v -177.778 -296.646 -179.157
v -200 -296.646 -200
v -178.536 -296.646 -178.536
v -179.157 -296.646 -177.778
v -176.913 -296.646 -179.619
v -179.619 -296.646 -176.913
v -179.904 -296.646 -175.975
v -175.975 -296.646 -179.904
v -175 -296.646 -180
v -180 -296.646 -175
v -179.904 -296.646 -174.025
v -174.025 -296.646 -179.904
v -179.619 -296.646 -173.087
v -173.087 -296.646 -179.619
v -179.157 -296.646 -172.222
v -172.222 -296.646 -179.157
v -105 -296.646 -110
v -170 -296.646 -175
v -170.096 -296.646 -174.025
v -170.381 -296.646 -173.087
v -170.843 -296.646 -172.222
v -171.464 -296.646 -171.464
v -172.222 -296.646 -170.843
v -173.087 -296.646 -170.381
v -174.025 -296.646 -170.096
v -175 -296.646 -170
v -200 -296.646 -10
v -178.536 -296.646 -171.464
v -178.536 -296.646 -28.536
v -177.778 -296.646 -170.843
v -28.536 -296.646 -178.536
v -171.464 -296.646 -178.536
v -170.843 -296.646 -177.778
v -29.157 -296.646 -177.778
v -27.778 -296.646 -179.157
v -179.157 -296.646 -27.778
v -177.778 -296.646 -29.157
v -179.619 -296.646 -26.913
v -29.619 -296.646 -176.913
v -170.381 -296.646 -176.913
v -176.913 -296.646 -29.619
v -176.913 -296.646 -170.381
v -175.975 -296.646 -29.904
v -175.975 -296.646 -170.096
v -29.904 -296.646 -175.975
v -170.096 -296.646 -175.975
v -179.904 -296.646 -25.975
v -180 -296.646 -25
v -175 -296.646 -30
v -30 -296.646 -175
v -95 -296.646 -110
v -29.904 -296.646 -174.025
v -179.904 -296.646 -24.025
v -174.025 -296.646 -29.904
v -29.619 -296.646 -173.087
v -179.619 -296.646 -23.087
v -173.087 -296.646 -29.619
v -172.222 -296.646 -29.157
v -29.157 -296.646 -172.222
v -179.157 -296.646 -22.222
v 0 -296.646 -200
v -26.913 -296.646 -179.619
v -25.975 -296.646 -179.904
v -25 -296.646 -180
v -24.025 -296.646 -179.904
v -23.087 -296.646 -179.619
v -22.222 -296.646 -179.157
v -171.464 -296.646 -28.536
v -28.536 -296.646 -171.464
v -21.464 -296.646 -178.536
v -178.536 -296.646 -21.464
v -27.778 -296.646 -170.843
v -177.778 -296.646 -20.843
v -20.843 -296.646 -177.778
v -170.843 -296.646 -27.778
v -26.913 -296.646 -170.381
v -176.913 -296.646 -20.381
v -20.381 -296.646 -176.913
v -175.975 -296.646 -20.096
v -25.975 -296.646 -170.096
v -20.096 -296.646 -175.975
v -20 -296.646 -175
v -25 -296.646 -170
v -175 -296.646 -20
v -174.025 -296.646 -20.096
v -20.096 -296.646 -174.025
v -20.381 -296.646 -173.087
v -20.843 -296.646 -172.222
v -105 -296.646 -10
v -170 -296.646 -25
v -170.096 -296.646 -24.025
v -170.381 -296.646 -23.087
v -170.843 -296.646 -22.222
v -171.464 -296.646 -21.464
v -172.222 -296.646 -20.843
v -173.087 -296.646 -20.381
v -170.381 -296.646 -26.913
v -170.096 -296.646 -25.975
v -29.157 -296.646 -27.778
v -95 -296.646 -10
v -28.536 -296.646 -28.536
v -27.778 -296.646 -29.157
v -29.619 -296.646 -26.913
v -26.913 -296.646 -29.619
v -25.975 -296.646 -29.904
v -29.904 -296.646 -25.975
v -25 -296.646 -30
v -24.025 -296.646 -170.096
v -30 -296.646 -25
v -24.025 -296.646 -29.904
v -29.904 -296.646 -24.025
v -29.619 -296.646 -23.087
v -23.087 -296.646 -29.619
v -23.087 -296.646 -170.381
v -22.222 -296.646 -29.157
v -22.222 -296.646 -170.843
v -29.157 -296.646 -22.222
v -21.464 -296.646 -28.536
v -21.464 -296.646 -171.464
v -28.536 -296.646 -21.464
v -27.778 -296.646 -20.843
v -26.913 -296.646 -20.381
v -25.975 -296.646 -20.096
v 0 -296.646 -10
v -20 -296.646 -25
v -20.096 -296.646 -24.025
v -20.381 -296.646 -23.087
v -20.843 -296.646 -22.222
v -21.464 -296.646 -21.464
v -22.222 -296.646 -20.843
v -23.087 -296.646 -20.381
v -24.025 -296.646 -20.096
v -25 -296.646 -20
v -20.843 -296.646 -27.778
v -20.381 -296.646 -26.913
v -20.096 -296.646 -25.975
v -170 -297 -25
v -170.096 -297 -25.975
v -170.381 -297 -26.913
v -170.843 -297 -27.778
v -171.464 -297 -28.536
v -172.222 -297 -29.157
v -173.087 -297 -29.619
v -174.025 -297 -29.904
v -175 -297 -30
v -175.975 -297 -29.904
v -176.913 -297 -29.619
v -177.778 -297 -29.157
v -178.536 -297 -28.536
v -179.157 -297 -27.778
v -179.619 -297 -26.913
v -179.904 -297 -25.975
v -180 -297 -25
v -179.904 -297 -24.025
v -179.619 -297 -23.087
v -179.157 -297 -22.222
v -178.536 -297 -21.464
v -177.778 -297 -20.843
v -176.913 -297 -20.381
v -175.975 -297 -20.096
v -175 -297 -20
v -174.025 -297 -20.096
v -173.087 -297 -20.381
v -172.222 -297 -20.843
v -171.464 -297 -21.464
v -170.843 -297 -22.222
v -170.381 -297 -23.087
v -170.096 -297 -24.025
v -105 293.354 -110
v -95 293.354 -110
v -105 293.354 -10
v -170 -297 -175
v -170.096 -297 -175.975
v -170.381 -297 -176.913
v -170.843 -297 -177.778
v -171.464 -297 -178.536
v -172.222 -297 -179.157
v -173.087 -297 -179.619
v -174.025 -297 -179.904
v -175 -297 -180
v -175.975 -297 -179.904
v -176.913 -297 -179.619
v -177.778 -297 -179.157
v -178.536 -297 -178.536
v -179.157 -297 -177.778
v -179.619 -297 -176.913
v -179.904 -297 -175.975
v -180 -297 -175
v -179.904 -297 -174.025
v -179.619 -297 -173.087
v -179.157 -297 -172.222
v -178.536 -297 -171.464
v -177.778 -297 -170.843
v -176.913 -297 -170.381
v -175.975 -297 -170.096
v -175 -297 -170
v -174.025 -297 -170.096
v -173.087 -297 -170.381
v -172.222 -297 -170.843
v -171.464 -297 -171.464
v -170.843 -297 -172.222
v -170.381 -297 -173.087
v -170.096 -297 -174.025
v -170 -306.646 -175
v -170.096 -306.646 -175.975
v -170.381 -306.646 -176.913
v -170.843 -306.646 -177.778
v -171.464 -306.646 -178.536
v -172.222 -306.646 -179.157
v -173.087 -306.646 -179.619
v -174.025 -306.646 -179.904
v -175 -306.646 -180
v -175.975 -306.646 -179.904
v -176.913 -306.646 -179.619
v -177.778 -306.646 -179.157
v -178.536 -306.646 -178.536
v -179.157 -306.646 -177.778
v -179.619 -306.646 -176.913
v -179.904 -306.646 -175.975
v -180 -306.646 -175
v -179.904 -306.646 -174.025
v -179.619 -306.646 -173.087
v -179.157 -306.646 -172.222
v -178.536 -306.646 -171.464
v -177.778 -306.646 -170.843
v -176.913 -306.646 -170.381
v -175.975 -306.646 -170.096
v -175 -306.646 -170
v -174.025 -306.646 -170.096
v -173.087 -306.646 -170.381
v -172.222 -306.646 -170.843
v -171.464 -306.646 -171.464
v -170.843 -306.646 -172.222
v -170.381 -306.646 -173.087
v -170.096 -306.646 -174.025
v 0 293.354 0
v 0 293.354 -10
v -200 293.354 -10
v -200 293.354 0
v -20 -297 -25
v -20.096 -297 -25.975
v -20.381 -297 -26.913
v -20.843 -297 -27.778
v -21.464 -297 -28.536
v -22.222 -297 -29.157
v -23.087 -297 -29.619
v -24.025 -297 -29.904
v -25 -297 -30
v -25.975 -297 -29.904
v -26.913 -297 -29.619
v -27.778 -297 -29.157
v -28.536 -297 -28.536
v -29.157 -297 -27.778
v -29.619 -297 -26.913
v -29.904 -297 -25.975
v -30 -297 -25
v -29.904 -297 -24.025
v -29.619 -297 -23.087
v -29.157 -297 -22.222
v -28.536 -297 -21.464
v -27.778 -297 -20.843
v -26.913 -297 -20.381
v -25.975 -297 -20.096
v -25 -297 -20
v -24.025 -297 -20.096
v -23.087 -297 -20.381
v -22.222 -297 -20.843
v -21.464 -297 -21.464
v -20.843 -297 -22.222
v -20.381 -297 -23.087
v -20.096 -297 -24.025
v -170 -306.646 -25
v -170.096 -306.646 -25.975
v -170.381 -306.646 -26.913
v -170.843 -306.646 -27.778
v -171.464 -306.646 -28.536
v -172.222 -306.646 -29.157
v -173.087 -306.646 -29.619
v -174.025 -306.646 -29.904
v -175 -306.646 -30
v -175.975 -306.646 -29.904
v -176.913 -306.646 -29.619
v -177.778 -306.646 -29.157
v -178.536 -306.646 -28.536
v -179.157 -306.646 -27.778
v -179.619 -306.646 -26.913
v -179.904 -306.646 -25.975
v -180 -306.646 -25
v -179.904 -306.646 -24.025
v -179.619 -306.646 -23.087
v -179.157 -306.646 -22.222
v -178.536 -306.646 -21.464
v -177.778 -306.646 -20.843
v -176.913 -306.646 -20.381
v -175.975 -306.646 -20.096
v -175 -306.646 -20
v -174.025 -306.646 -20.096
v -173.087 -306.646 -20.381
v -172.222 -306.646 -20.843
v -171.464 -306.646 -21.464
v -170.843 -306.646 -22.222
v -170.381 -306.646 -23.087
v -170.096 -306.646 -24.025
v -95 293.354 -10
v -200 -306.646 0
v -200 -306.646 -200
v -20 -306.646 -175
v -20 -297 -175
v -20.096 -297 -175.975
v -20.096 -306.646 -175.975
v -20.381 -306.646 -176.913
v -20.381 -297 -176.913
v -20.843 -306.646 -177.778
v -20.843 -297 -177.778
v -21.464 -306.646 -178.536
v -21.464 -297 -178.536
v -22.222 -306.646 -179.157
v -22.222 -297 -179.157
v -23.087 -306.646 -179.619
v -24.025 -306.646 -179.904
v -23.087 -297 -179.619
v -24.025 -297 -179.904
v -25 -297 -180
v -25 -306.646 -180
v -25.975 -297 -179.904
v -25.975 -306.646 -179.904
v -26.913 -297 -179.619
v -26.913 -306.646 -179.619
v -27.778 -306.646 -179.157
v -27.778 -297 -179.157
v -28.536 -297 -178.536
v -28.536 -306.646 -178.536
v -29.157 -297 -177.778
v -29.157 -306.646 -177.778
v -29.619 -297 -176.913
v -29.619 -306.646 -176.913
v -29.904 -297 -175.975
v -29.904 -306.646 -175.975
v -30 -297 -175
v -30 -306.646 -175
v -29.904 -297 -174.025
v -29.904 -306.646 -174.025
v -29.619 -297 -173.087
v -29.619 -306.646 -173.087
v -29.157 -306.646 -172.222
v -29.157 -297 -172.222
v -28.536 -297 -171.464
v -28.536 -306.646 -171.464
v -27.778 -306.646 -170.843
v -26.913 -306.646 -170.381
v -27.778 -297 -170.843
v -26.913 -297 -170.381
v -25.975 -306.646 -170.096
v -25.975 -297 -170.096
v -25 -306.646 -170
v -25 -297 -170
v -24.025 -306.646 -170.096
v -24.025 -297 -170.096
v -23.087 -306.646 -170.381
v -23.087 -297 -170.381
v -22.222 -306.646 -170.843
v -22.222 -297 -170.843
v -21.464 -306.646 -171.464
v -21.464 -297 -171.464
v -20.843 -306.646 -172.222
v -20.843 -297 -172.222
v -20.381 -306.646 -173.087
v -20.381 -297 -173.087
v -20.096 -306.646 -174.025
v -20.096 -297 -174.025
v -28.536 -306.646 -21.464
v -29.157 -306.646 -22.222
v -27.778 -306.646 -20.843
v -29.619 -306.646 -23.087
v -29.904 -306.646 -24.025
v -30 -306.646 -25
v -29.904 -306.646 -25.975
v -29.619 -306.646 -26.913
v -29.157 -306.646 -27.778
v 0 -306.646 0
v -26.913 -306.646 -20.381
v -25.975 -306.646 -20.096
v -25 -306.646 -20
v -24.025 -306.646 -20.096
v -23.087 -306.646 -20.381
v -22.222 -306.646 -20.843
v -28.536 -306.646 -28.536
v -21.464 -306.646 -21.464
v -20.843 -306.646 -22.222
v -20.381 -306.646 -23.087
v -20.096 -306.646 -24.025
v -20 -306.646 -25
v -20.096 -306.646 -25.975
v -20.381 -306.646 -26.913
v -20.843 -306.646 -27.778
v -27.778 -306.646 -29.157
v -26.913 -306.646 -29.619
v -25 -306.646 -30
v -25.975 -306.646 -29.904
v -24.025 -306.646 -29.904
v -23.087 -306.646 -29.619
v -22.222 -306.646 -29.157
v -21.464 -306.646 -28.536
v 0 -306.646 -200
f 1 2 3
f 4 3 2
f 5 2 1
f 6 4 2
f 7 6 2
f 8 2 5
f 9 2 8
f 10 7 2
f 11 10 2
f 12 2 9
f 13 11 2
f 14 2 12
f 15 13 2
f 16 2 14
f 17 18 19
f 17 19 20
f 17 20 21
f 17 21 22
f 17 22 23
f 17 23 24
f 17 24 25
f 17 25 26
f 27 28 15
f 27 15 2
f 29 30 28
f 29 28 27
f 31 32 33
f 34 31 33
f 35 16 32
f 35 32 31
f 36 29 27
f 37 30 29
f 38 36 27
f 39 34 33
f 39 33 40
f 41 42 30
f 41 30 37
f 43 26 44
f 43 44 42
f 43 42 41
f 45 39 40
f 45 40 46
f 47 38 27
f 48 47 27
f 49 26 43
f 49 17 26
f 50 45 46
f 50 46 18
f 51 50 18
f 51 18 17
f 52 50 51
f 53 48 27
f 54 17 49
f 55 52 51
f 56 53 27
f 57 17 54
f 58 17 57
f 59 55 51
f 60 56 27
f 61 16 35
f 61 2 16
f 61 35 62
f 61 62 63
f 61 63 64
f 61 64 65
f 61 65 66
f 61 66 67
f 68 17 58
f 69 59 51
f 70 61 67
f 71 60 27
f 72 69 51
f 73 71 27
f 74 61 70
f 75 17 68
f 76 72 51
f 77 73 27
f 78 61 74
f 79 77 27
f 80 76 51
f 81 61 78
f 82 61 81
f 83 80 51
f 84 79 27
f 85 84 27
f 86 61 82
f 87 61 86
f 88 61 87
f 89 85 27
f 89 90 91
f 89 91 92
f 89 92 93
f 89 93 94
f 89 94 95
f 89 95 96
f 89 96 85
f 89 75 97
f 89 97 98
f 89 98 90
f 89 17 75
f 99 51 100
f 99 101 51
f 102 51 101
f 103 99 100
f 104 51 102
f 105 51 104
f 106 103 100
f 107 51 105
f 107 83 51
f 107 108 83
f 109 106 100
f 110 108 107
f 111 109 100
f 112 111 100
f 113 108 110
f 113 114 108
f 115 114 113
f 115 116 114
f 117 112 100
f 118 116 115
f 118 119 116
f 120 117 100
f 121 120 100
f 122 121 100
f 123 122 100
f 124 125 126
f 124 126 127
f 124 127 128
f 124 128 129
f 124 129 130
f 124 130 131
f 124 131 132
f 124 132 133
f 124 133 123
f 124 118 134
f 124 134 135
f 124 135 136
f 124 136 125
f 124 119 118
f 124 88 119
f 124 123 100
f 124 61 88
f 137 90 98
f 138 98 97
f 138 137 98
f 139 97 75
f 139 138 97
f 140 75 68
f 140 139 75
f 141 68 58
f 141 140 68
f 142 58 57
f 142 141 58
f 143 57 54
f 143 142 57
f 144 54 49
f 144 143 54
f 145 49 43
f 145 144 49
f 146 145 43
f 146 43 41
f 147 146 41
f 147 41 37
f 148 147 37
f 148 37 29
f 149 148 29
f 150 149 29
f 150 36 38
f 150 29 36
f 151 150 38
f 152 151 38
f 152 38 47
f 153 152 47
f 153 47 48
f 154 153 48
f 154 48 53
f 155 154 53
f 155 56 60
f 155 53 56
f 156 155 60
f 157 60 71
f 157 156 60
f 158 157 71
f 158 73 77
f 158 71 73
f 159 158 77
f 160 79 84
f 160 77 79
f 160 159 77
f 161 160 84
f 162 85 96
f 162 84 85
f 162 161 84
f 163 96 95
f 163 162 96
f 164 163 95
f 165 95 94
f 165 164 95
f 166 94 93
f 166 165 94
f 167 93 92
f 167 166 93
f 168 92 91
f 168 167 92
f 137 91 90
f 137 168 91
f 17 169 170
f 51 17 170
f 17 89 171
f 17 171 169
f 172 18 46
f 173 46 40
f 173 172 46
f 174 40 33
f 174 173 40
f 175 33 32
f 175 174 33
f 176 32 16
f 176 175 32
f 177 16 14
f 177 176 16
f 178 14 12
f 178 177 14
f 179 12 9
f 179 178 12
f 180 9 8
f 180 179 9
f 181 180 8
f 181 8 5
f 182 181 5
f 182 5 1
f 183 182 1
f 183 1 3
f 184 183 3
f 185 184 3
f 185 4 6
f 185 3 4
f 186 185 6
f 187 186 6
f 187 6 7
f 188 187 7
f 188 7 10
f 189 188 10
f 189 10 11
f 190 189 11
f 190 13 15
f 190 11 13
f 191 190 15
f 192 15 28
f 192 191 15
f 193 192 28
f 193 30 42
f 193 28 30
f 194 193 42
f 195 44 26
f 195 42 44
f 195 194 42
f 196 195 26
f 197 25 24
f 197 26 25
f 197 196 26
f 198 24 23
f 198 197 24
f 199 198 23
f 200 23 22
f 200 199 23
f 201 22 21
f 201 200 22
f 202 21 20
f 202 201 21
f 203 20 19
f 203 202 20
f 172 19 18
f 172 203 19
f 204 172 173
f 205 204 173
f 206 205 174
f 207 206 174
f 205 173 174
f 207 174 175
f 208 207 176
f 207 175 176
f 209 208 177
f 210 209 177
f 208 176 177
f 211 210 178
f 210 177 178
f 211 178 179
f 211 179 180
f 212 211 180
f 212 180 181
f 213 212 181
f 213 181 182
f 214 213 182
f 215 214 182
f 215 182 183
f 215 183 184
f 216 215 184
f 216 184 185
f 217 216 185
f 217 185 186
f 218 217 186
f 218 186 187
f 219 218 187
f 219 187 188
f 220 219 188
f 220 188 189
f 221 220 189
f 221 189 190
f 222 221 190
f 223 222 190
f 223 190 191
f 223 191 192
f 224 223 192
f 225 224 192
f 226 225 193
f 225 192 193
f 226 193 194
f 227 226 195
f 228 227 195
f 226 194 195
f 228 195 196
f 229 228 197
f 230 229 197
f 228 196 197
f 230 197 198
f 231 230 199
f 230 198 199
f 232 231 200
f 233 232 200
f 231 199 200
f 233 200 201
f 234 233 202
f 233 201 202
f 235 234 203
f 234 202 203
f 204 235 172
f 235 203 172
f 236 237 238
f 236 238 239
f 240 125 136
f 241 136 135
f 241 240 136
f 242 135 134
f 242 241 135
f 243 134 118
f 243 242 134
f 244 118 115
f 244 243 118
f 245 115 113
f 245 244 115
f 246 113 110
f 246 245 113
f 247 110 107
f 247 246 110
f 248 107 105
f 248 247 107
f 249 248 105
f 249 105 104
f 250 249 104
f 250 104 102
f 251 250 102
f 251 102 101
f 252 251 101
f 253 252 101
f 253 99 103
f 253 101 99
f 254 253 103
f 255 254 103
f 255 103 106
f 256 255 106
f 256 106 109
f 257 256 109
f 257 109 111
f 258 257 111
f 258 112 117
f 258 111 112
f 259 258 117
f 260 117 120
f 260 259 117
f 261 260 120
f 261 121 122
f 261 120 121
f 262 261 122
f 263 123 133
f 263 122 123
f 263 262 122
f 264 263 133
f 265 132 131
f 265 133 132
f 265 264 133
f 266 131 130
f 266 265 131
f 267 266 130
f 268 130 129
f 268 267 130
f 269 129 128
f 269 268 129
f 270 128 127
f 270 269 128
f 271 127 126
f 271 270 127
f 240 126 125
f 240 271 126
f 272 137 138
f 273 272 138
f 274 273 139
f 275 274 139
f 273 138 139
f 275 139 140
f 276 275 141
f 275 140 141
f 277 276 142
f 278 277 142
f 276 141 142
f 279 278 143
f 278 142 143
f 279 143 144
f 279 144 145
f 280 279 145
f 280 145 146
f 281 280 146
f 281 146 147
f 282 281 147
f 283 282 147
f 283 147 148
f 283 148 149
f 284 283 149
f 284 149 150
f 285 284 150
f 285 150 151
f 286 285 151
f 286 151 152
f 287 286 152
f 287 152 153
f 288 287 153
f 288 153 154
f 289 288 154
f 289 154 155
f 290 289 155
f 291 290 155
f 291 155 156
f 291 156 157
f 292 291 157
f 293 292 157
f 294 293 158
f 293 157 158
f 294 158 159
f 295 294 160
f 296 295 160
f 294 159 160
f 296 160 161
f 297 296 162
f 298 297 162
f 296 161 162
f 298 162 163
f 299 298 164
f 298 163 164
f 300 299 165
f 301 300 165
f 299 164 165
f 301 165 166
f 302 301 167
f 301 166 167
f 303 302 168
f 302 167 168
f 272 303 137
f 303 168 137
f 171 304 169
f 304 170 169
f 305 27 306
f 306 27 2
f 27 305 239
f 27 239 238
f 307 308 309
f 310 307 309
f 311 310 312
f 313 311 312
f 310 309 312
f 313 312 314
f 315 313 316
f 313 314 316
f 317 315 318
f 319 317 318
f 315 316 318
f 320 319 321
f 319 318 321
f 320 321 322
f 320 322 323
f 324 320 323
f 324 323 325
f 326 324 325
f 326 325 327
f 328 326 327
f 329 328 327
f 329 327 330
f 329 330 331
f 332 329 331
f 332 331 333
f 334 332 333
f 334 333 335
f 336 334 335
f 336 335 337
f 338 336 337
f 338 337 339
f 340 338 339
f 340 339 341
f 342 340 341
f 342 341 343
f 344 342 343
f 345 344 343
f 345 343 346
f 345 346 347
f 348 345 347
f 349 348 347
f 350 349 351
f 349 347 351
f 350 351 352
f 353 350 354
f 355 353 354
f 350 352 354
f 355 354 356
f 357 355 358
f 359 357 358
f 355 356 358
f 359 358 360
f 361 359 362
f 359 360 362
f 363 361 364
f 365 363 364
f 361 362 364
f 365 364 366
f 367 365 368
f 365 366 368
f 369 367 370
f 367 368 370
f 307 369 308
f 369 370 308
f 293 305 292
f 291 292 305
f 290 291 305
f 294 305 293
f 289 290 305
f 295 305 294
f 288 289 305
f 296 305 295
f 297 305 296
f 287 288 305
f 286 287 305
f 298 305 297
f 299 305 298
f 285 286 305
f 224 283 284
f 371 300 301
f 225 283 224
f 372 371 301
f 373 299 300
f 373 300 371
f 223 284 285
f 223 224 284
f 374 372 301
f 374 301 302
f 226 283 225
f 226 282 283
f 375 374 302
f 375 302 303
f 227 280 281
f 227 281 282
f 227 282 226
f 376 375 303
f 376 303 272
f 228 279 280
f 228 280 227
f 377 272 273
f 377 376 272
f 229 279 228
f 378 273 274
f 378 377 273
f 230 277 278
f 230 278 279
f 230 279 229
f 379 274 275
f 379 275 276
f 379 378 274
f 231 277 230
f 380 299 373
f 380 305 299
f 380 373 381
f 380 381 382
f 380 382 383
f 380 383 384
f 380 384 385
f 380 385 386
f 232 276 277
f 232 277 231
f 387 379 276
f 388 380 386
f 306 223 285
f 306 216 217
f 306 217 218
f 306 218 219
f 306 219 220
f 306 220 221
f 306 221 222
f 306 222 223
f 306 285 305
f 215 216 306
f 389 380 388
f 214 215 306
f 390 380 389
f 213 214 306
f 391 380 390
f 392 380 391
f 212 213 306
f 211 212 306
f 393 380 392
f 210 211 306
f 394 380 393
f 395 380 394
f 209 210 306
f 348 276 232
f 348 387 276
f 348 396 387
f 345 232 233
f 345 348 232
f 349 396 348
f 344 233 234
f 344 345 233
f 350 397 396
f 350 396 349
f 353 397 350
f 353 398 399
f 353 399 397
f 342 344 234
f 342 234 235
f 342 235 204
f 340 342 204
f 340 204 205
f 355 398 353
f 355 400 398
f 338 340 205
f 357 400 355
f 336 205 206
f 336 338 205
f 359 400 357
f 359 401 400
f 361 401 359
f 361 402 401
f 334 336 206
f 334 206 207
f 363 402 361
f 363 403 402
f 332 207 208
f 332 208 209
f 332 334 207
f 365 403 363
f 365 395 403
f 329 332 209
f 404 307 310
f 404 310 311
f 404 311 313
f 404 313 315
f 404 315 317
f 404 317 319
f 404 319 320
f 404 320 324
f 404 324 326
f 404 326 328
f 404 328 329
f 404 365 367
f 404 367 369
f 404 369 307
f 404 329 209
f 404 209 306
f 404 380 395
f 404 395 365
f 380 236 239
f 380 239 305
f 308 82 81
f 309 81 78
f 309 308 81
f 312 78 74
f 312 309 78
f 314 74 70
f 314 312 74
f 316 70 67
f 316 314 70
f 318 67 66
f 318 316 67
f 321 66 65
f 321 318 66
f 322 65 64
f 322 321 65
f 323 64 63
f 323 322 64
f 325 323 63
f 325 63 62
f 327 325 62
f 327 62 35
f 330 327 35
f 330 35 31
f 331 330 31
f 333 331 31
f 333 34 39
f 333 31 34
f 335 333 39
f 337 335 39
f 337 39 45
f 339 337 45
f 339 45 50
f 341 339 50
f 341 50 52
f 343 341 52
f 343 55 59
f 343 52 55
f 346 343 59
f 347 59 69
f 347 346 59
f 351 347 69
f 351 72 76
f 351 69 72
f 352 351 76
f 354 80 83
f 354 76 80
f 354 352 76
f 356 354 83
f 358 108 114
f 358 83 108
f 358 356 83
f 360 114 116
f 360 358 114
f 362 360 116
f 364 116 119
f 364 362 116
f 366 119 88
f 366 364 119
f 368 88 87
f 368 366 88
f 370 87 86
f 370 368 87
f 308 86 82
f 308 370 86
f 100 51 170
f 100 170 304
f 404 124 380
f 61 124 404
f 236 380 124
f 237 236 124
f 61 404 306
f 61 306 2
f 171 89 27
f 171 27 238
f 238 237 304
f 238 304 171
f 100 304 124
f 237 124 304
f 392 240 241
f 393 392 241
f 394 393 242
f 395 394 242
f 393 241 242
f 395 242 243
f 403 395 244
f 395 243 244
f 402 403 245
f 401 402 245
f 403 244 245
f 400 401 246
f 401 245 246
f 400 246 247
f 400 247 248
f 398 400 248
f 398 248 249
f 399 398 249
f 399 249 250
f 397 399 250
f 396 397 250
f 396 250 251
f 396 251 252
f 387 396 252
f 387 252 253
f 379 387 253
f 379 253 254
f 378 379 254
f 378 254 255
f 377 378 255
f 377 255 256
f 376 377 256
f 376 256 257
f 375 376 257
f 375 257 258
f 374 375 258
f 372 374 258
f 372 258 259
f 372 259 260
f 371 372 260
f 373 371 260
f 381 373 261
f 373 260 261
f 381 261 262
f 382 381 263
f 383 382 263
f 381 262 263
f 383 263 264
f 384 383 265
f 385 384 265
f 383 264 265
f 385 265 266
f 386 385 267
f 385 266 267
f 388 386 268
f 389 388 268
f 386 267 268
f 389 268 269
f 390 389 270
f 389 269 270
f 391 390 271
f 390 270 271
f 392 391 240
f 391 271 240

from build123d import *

# Parameters (mm, degrees)
SALIENTE_EXTRUIR1_DEPTH    = 200
SALIENTE_EXTRUIR2_DEPTH    = 590.35443
CROQUIS6_R                 = 5
CORTAR_EXTRUIR1_DEPTH      = 591.35443038
CORTAR_EXTRUIR1_DEPTH_BACK = 10.64556962


with BuildPart() as part:
    # Croquis2 → Saliente-Extruir1 (new body)
    with BuildSketch(Plane(origin=(0, 0, 0), x_dir=(0, 0, -1), z_dir=(1, 0, 0))):
        Polygon((0, 293.35443038), (0, -306.64556962), (200, -306.64556962), (200, -296.64556962), (10, -296.64556962), (10, 293.35443038), align=None)
    extrude(amount=-SALIENTE_EXTRUIR1_DEPTH)

    # Croquis5 → Saliente-Extruir2 (add, through all)
    with BuildSketch(Plane(origin=(0, -297, 0), x_dir=(1, 0, 0), z_dir=(0, 1, 0))):
        Polygon((-100, 10), (-105, 10), (-105, 110), (-95, 110), (-95, 10), align=None)
    extrude(amount=SALIENTE_EXTRUIR2_DEPTH)

    # Croquis6 → Cortar-Extruir1 (cut, two sides)
    with BuildSketch(Plane(origin=(0, -297, 0), x_dir=(1, 0, 0), z_dir=(0, 1, 0))) as cortar_extruir1_sk:
        with Locations((-175, 175)):
            Circle(CROQUIS6_R)
        with Locations((-25, 175)):
            Circle(CROQUIS6_R)
        with Locations((-25, 25)):
            Circle(CROQUIS6_R)
        with Locations((-175, 25)):
            Circle(CROQUIS6_R)
    extrude(amount=CORTAR_EXTRUIR1_DEPTH, mode=Mode.SUBTRACT)
    extrude(cortar_extruir1_sk.sketch, amount=-CORTAR_EXTRUIR1_DEPTH_BACK, mode=Mode.SUBTRACT)


solid = part.part
